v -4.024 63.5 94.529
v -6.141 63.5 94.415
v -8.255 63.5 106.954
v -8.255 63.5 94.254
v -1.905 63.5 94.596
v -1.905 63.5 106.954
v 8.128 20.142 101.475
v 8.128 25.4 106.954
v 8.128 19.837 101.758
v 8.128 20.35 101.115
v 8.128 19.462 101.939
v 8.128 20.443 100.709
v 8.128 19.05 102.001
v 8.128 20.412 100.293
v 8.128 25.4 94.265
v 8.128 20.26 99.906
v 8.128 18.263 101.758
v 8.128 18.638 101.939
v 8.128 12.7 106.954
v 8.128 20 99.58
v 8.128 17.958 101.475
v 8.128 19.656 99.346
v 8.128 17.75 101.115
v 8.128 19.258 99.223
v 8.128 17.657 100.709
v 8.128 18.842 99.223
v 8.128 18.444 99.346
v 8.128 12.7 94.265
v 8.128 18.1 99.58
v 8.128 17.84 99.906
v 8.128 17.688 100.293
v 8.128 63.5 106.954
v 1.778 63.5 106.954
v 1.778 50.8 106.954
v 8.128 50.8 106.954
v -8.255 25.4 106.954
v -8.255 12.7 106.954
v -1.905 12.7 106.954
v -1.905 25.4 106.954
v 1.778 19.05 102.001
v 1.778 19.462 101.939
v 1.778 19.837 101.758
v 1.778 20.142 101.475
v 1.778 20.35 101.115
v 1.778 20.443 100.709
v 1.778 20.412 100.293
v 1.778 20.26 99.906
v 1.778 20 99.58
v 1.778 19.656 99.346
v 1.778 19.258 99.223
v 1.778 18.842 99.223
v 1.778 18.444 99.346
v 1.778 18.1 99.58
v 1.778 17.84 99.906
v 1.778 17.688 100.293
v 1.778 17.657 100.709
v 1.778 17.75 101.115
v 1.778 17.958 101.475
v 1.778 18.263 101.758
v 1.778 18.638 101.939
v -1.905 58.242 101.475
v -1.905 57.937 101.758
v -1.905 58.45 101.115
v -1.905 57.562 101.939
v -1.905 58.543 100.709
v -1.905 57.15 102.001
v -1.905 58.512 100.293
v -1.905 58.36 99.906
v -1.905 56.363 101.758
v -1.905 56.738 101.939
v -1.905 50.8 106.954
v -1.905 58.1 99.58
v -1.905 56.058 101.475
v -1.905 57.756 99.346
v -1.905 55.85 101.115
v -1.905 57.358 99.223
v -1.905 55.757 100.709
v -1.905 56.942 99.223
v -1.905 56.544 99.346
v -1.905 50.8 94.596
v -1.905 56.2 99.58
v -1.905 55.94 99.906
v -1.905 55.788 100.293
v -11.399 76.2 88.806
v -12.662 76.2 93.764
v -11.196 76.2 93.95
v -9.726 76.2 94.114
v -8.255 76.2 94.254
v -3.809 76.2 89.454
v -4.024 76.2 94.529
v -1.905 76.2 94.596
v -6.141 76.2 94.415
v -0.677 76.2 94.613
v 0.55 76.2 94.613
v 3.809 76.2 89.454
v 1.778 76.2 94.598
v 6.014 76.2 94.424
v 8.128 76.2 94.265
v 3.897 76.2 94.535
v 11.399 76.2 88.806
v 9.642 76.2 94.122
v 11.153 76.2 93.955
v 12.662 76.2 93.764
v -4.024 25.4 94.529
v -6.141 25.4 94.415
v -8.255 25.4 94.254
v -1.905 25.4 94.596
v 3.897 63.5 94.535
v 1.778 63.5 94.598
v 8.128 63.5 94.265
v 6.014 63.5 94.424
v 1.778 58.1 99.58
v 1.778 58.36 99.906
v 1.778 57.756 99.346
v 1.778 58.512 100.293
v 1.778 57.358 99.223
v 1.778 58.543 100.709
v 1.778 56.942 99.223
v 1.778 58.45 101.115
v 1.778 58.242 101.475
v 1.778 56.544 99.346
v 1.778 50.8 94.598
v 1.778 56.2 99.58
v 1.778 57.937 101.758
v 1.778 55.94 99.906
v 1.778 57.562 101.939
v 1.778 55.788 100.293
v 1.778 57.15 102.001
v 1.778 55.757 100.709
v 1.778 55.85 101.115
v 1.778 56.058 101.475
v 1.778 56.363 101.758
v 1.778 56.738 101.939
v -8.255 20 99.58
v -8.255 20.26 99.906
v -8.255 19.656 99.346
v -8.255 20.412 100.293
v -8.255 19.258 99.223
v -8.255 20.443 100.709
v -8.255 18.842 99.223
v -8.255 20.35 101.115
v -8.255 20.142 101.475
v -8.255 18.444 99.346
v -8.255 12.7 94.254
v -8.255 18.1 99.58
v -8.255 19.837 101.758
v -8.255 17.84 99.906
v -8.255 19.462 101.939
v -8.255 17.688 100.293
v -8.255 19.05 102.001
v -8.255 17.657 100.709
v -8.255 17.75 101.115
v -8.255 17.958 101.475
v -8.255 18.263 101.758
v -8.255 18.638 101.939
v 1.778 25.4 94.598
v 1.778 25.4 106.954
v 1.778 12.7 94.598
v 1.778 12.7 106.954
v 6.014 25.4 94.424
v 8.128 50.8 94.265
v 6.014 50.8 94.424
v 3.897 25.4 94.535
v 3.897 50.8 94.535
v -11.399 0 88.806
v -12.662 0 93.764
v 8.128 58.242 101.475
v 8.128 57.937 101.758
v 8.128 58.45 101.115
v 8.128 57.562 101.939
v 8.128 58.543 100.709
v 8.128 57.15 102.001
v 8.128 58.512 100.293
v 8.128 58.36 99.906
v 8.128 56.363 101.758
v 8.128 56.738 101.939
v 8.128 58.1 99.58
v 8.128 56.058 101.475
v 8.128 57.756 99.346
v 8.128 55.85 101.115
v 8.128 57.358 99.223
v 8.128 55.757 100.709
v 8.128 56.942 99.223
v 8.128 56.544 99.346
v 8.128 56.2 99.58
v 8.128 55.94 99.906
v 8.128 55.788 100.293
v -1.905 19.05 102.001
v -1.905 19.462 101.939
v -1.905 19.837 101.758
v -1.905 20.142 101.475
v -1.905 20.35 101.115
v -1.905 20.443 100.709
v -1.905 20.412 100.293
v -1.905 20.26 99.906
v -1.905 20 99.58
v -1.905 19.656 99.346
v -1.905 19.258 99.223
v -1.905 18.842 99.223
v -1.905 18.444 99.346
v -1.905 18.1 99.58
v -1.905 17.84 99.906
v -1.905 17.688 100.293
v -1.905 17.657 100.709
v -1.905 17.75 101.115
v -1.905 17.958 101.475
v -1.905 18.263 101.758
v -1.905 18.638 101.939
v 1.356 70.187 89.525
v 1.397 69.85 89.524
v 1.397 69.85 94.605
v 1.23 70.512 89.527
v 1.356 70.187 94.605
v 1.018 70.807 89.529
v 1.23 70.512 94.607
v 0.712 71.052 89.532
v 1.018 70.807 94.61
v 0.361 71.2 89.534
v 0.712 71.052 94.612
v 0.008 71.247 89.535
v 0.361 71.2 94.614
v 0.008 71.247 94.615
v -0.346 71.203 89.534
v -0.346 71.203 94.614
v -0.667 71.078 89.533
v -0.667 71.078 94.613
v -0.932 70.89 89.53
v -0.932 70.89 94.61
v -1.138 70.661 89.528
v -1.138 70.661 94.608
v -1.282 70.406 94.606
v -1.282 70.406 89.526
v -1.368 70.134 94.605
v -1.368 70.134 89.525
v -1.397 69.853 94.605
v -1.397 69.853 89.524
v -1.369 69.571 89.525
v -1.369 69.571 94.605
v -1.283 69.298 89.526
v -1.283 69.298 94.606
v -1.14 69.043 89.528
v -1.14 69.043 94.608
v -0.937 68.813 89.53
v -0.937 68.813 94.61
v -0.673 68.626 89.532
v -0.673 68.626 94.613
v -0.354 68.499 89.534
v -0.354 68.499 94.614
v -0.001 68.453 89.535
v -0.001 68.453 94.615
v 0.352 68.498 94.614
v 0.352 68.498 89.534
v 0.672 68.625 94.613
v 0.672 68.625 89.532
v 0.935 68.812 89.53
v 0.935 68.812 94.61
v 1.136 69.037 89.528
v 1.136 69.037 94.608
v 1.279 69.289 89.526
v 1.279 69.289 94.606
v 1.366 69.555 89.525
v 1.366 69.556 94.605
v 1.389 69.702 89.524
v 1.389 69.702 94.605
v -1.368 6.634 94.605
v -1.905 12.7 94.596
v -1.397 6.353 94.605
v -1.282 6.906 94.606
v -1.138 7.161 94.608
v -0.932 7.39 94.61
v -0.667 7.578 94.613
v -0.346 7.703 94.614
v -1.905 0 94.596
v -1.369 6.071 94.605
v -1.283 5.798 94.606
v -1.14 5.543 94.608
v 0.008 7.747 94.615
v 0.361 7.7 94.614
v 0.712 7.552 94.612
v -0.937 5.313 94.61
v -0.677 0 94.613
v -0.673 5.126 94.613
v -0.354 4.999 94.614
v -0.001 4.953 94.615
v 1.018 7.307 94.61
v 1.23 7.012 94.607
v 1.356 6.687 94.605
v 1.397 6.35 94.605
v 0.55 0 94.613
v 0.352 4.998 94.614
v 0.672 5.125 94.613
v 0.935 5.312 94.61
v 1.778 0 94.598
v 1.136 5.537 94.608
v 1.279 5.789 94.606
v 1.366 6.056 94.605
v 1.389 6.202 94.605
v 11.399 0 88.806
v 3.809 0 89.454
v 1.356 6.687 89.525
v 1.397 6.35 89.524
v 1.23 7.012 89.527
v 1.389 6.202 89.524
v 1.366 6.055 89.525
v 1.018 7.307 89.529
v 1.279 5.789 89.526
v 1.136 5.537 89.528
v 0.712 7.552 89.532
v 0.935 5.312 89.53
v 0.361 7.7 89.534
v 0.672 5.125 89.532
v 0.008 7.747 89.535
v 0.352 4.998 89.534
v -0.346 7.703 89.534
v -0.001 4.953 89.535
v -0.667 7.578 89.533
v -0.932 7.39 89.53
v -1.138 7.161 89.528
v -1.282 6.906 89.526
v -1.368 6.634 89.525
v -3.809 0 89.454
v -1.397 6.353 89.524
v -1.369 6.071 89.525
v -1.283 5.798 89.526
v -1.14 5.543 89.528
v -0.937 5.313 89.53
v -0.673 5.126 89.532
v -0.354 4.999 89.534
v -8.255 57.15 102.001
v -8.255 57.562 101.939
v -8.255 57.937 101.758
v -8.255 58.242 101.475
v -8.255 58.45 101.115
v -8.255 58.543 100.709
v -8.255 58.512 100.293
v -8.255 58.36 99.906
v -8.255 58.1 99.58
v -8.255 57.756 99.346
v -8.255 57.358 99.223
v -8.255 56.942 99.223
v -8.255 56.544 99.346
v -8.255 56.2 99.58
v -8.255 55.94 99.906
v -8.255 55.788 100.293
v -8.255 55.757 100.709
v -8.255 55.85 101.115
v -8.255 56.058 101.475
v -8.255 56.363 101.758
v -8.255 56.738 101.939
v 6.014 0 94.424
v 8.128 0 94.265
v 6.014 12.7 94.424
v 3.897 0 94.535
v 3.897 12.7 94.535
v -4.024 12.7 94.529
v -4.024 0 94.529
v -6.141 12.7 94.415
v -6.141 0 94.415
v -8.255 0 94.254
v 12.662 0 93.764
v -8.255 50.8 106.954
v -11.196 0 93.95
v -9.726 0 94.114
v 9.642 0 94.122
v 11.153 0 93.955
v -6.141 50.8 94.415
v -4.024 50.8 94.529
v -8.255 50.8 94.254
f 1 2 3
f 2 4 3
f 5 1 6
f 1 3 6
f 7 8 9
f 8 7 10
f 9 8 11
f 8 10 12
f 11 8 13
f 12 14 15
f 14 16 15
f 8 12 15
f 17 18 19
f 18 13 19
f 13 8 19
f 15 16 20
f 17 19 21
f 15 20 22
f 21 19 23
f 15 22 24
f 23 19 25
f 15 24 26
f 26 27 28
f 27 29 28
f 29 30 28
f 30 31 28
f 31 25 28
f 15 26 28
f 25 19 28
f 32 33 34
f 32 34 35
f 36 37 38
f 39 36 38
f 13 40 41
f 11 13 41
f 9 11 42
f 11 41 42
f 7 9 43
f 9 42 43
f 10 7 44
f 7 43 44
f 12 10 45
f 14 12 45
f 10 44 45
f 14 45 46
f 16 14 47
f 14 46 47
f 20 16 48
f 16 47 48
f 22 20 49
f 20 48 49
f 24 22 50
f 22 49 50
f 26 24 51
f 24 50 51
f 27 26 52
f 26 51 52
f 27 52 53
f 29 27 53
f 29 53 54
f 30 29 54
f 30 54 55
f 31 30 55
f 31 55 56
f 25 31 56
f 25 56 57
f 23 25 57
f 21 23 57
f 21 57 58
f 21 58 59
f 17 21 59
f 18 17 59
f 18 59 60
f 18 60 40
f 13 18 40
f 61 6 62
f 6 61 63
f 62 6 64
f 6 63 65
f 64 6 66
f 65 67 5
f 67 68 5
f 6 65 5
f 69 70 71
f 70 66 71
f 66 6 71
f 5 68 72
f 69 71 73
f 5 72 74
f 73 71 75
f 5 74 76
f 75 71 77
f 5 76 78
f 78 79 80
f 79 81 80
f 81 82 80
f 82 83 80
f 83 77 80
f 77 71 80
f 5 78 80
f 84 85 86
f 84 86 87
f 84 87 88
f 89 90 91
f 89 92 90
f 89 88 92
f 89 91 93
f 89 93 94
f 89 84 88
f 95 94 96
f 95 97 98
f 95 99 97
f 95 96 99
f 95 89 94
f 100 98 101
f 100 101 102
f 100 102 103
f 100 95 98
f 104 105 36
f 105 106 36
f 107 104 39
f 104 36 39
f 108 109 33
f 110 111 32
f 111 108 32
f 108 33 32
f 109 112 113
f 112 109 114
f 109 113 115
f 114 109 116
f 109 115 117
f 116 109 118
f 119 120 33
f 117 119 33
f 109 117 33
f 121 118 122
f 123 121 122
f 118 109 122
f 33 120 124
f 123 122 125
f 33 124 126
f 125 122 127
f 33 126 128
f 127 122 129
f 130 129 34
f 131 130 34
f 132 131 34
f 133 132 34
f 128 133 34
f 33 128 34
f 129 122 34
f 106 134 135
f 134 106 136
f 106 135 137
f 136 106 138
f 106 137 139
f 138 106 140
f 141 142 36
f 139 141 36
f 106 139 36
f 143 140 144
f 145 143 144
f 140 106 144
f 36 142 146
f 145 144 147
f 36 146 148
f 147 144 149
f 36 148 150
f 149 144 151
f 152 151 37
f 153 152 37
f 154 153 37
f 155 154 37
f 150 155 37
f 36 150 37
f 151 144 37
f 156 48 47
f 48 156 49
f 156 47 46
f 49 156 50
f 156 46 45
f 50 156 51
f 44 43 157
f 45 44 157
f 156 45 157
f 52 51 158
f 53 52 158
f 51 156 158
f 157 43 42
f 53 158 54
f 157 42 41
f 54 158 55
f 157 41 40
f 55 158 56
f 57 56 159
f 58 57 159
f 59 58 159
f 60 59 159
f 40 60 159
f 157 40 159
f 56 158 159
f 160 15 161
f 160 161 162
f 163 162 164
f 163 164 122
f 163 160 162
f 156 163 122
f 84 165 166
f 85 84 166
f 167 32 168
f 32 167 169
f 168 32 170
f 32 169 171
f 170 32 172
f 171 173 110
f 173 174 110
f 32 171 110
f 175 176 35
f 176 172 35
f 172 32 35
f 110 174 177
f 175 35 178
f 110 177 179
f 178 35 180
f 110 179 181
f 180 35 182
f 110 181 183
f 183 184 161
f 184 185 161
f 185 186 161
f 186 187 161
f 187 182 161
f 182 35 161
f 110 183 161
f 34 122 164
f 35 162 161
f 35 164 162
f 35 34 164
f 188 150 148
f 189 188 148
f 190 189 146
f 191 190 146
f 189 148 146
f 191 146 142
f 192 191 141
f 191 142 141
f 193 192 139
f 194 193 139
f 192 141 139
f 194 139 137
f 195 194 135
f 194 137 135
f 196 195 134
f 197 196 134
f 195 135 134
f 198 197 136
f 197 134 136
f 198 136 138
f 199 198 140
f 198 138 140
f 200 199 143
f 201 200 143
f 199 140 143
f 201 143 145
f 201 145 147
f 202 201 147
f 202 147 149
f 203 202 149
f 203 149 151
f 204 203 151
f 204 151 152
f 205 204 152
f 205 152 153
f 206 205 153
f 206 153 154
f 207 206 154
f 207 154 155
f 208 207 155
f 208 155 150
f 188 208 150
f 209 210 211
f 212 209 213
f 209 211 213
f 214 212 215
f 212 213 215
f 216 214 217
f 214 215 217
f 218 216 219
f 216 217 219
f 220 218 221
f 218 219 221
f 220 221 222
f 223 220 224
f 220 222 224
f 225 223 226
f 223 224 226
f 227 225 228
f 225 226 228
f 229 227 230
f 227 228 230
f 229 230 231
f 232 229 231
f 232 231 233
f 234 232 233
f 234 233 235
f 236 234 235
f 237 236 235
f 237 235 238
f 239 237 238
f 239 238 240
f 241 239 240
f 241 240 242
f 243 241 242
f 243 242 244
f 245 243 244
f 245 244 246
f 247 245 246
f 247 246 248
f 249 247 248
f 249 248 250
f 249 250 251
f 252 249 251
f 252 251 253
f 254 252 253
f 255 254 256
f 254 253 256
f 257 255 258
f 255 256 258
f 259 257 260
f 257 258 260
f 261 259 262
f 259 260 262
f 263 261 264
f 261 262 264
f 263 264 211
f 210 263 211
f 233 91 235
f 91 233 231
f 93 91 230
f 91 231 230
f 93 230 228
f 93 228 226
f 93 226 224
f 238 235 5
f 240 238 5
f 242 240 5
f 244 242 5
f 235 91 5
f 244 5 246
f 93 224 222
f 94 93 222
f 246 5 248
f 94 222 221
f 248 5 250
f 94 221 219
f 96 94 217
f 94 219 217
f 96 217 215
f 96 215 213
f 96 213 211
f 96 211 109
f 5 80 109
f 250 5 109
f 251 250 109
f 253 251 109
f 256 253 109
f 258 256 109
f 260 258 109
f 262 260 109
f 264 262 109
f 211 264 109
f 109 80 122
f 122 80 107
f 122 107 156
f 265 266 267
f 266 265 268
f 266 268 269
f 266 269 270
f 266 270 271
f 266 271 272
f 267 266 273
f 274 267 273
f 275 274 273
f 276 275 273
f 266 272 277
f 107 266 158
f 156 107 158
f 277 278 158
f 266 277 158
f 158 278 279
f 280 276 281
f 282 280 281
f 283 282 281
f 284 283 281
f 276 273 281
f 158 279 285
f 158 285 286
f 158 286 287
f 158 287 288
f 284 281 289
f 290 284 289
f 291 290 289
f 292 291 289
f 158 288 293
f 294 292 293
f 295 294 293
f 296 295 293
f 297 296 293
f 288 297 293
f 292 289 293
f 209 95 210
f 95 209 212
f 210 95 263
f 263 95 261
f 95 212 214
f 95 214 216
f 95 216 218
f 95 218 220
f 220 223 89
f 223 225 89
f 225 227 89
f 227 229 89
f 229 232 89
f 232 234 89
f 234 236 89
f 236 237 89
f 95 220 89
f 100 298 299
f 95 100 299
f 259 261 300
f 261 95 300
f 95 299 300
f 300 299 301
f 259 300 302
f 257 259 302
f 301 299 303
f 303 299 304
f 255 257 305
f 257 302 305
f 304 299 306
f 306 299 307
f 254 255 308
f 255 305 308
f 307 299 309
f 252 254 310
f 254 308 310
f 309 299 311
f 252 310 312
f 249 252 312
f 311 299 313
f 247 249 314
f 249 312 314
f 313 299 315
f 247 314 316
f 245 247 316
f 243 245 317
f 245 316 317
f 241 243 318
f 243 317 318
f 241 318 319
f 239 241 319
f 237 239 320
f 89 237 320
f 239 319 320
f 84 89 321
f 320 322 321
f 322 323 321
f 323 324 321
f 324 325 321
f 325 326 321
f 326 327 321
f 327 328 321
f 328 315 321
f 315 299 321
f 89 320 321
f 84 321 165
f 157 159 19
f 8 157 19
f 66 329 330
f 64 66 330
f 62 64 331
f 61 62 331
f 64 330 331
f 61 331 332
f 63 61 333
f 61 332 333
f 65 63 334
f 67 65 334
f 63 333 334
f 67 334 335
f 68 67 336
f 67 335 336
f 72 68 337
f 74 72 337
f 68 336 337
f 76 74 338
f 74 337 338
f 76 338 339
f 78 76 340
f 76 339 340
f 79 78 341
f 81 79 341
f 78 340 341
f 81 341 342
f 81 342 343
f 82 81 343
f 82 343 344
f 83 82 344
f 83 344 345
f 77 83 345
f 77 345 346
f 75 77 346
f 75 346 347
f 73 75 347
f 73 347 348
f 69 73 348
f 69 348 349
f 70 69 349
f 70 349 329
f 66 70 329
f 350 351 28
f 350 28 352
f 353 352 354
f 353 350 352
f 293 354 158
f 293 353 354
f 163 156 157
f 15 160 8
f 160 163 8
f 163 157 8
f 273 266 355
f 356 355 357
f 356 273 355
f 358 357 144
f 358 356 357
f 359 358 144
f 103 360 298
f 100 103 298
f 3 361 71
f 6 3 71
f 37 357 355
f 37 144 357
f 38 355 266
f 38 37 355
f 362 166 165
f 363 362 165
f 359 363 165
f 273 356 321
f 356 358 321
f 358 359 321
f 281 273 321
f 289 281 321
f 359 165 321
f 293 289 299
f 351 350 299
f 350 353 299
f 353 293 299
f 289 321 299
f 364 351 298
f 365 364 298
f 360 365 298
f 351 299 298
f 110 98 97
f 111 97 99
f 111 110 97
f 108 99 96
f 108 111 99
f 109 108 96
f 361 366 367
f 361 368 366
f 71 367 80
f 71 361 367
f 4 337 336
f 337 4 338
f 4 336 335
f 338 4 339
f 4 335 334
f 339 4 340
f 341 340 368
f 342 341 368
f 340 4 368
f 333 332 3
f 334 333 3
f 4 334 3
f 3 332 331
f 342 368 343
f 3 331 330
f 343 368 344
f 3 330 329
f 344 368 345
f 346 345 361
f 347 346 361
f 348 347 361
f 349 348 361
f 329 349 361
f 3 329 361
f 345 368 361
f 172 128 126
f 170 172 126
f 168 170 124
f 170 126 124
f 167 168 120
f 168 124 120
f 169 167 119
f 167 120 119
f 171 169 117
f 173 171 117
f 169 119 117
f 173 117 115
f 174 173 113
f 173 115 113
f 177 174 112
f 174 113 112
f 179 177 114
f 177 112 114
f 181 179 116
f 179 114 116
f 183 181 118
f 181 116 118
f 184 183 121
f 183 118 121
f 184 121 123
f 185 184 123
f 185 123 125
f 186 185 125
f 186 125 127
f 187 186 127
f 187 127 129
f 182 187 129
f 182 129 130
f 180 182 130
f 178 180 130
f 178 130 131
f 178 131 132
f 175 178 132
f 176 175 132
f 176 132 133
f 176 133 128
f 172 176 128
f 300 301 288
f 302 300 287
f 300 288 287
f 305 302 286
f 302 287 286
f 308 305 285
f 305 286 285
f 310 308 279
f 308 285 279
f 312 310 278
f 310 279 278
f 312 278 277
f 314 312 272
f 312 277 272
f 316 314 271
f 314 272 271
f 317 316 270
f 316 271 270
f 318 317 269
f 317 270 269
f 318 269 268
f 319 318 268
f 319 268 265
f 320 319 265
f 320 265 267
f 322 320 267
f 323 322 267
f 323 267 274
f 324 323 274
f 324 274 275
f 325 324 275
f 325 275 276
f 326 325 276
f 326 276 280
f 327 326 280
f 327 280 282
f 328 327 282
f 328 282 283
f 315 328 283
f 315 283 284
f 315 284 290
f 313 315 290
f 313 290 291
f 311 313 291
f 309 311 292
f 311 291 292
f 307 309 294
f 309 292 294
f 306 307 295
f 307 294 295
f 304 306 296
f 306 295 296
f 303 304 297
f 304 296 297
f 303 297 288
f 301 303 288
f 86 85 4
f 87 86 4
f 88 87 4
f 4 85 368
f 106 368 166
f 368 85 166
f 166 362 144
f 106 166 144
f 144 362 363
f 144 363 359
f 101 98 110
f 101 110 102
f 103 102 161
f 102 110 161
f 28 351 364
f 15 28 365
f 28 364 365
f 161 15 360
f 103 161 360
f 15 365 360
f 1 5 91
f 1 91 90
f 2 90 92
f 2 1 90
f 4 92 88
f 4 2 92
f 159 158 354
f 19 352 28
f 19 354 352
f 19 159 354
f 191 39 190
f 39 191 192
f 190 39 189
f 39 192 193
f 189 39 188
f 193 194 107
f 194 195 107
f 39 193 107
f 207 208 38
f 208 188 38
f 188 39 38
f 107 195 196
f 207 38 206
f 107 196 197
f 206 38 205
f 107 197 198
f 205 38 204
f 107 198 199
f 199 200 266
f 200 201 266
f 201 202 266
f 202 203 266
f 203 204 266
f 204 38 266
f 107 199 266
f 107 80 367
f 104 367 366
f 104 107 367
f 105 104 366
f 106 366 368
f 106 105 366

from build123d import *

# Parameters (mm, degrees)
BOSS_EXTRUDE1_DEPTH     = 76.2
SKETCH3_R               = 1.397
CUT_EXTRUDE2_DEPTH      = 25.4
CUT_EXTRUDE4_REACH      = 81.348
CUT_EXTRUDE4_END_RADIUS = 94.615
SKETCH6_W               = 16.383
SKETCH6_H               = 25.4
SKETCH6_H_2             = 12.7
SKETCH7_R               = 1.397
CUT_EXTRUDE5_DEPTH      = 50.8


with BuildPart() as part:
    # Sketch1 → Boss-Extrude1 (new body)
    with BuildSketch(Plane(origin=(0, 0, 0), x_dir=(1, 0, 0), z_dir=(0, 1, 0))):
        with BuildLine():
            Line((-8.255, -94.254194602), (-8.255, -106.954194602))
            Line((-8.255, -106.954194602), (-1.905, -106.954194602))
            Line((-1.905, -106.954194602), (-1.905, -94.595820204))
            ThreePointArc((-1.905, -94.595820204), (-0.063512031, -94.614978683), (1.778, -94.598292485))
            Line((1.778, -94.598292485), (1.778, -106.954194602))
            Line((1.778, -106.954194602), (8.128, -106.954194602))
            Line((8.128, -106.954194602), (8.128, -94.265231348))
            ThreePointArc((8.128, -94.265231348), (10.397970458, -94.041907867), (12.661897921, -93.763929984))
            Line((12.661897921, -93.763929984), (11.398979566, -88.806415815))
            ThreePointArc((11.398979566, -88.806415815), (0, -89.535), (-11.398979566, -88.806415815))
            Line((-11.398979566, -88.806415815), (-12.661897921, -93.763929984))
            ThreePointArc((-12.661897921, -93.763929984), (-10.461321356, -94.034881722), (-8.255, -94.254194602))
        make_face()
    extrude(amount=BOSS_EXTRUDE1_DEPTH)

    # Sketch3 → Cut-Extrude2 (cut)
    with BuildSketch(Plane.ZY.offset(8.255)):
        with Locations((100.604194602, 57.15)):
            Circle(SKETCH3_R)
        with Locations((100.604194602, 19.05)):
            Circle(SKETCH3_R)
    extrude(amount=-CUT_EXTRUDE2_DEPTH, mode=Mode.SUBTRACT)

    # Cut-Extrude4: up to this cylinder (the profile starts outside it)
    cut_extrude4_end = Plane(origin=(0, 38.1, 0), z_dir=(0, -1, 0)) * Cylinder(CUT_EXTRUDE4_END_RADIUS, 416.426, mode=Mode.PRIVATE)
    # Sketch6 → Cut-Extrude4 (cut, up to the surface)
    with BuildSketch(Plane.XY.offset(106.954194602), mode=Mode.PRIVATE) as cut_extrude4_sk1:
        with Locations((-0.0635, 38.1)):
            Rectangle(SKETCH6_W, SKETCH6_H)
    cut_extrude4_tool1 = extrude(cut_extrude4_sk1.sketch, amount=-CUT_EXTRUDE4_REACH, mode=Mode.PRIVATE) - cut_extrude4_end
    add(cut_extrude4_tool1.solids().sort_by_distance((-0.0635, 38.1, 106.954195))[0], mode=Mode.SUBTRACT)
    # Sketch6 → Cut-Extrude4 (cut, up to the surface)
    with BuildSketch(Plane.XY.offset(106.954194602), mode=Mode.PRIVATE) as cut_extrude4_sk2:
        with Locations((-0.0635, 69.85)):
            Rectangle(SKETCH6_W, SKETCH6_H_2)
    cut_extrude4_tool2 = extrude(cut_extrude4_sk2.sketch, amount=-CUT_EXTRUDE4_REACH, mode=Mode.PRIVATE) - cut_extrude4_end
    add(cut_extrude4_tool2.solids().sort_by_distance((-0.0635, 69.85, 106.954195))[0], mode=Mode.SUBTRACT)
    # Sketch6 → Cut-Extrude4 (cut, up to the surface)
    with BuildSketch(Plane.XY.offset(106.954194602), mode=Mode.PRIVATE) as cut_extrude4_sk3:
        with Locations((-0.0635, 6.35)):
            Rectangle(SKETCH6_W, SKETCH6_H_2)
    cut_extrude4_tool3 = extrude(cut_extrude4_sk3.sketch, amount=-CUT_EXTRUDE4_REACH, mode=Mode.PRIVATE) - cut_extrude4_end
    add(cut_extrude4_tool3.solids().sort_by_distance((-0.0635, 6.35, 106.954195))[0], mode=Mode.SUBTRACT)

    # Sketch7 → Cut-Extrude5 (cut)
    with BuildSketch(Plane.XY.offset(106.954194602)):
        with Locations((0, 69.85)):
            Circle(SKETCH7_R)
        with Locations((0, 6.35)):
            Circle(SKETCH7_R)
    extrude(amount=-CUT_EXTRUDE5_DEPTH, mode=Mode.SUBTRACT)


solid = part.part
